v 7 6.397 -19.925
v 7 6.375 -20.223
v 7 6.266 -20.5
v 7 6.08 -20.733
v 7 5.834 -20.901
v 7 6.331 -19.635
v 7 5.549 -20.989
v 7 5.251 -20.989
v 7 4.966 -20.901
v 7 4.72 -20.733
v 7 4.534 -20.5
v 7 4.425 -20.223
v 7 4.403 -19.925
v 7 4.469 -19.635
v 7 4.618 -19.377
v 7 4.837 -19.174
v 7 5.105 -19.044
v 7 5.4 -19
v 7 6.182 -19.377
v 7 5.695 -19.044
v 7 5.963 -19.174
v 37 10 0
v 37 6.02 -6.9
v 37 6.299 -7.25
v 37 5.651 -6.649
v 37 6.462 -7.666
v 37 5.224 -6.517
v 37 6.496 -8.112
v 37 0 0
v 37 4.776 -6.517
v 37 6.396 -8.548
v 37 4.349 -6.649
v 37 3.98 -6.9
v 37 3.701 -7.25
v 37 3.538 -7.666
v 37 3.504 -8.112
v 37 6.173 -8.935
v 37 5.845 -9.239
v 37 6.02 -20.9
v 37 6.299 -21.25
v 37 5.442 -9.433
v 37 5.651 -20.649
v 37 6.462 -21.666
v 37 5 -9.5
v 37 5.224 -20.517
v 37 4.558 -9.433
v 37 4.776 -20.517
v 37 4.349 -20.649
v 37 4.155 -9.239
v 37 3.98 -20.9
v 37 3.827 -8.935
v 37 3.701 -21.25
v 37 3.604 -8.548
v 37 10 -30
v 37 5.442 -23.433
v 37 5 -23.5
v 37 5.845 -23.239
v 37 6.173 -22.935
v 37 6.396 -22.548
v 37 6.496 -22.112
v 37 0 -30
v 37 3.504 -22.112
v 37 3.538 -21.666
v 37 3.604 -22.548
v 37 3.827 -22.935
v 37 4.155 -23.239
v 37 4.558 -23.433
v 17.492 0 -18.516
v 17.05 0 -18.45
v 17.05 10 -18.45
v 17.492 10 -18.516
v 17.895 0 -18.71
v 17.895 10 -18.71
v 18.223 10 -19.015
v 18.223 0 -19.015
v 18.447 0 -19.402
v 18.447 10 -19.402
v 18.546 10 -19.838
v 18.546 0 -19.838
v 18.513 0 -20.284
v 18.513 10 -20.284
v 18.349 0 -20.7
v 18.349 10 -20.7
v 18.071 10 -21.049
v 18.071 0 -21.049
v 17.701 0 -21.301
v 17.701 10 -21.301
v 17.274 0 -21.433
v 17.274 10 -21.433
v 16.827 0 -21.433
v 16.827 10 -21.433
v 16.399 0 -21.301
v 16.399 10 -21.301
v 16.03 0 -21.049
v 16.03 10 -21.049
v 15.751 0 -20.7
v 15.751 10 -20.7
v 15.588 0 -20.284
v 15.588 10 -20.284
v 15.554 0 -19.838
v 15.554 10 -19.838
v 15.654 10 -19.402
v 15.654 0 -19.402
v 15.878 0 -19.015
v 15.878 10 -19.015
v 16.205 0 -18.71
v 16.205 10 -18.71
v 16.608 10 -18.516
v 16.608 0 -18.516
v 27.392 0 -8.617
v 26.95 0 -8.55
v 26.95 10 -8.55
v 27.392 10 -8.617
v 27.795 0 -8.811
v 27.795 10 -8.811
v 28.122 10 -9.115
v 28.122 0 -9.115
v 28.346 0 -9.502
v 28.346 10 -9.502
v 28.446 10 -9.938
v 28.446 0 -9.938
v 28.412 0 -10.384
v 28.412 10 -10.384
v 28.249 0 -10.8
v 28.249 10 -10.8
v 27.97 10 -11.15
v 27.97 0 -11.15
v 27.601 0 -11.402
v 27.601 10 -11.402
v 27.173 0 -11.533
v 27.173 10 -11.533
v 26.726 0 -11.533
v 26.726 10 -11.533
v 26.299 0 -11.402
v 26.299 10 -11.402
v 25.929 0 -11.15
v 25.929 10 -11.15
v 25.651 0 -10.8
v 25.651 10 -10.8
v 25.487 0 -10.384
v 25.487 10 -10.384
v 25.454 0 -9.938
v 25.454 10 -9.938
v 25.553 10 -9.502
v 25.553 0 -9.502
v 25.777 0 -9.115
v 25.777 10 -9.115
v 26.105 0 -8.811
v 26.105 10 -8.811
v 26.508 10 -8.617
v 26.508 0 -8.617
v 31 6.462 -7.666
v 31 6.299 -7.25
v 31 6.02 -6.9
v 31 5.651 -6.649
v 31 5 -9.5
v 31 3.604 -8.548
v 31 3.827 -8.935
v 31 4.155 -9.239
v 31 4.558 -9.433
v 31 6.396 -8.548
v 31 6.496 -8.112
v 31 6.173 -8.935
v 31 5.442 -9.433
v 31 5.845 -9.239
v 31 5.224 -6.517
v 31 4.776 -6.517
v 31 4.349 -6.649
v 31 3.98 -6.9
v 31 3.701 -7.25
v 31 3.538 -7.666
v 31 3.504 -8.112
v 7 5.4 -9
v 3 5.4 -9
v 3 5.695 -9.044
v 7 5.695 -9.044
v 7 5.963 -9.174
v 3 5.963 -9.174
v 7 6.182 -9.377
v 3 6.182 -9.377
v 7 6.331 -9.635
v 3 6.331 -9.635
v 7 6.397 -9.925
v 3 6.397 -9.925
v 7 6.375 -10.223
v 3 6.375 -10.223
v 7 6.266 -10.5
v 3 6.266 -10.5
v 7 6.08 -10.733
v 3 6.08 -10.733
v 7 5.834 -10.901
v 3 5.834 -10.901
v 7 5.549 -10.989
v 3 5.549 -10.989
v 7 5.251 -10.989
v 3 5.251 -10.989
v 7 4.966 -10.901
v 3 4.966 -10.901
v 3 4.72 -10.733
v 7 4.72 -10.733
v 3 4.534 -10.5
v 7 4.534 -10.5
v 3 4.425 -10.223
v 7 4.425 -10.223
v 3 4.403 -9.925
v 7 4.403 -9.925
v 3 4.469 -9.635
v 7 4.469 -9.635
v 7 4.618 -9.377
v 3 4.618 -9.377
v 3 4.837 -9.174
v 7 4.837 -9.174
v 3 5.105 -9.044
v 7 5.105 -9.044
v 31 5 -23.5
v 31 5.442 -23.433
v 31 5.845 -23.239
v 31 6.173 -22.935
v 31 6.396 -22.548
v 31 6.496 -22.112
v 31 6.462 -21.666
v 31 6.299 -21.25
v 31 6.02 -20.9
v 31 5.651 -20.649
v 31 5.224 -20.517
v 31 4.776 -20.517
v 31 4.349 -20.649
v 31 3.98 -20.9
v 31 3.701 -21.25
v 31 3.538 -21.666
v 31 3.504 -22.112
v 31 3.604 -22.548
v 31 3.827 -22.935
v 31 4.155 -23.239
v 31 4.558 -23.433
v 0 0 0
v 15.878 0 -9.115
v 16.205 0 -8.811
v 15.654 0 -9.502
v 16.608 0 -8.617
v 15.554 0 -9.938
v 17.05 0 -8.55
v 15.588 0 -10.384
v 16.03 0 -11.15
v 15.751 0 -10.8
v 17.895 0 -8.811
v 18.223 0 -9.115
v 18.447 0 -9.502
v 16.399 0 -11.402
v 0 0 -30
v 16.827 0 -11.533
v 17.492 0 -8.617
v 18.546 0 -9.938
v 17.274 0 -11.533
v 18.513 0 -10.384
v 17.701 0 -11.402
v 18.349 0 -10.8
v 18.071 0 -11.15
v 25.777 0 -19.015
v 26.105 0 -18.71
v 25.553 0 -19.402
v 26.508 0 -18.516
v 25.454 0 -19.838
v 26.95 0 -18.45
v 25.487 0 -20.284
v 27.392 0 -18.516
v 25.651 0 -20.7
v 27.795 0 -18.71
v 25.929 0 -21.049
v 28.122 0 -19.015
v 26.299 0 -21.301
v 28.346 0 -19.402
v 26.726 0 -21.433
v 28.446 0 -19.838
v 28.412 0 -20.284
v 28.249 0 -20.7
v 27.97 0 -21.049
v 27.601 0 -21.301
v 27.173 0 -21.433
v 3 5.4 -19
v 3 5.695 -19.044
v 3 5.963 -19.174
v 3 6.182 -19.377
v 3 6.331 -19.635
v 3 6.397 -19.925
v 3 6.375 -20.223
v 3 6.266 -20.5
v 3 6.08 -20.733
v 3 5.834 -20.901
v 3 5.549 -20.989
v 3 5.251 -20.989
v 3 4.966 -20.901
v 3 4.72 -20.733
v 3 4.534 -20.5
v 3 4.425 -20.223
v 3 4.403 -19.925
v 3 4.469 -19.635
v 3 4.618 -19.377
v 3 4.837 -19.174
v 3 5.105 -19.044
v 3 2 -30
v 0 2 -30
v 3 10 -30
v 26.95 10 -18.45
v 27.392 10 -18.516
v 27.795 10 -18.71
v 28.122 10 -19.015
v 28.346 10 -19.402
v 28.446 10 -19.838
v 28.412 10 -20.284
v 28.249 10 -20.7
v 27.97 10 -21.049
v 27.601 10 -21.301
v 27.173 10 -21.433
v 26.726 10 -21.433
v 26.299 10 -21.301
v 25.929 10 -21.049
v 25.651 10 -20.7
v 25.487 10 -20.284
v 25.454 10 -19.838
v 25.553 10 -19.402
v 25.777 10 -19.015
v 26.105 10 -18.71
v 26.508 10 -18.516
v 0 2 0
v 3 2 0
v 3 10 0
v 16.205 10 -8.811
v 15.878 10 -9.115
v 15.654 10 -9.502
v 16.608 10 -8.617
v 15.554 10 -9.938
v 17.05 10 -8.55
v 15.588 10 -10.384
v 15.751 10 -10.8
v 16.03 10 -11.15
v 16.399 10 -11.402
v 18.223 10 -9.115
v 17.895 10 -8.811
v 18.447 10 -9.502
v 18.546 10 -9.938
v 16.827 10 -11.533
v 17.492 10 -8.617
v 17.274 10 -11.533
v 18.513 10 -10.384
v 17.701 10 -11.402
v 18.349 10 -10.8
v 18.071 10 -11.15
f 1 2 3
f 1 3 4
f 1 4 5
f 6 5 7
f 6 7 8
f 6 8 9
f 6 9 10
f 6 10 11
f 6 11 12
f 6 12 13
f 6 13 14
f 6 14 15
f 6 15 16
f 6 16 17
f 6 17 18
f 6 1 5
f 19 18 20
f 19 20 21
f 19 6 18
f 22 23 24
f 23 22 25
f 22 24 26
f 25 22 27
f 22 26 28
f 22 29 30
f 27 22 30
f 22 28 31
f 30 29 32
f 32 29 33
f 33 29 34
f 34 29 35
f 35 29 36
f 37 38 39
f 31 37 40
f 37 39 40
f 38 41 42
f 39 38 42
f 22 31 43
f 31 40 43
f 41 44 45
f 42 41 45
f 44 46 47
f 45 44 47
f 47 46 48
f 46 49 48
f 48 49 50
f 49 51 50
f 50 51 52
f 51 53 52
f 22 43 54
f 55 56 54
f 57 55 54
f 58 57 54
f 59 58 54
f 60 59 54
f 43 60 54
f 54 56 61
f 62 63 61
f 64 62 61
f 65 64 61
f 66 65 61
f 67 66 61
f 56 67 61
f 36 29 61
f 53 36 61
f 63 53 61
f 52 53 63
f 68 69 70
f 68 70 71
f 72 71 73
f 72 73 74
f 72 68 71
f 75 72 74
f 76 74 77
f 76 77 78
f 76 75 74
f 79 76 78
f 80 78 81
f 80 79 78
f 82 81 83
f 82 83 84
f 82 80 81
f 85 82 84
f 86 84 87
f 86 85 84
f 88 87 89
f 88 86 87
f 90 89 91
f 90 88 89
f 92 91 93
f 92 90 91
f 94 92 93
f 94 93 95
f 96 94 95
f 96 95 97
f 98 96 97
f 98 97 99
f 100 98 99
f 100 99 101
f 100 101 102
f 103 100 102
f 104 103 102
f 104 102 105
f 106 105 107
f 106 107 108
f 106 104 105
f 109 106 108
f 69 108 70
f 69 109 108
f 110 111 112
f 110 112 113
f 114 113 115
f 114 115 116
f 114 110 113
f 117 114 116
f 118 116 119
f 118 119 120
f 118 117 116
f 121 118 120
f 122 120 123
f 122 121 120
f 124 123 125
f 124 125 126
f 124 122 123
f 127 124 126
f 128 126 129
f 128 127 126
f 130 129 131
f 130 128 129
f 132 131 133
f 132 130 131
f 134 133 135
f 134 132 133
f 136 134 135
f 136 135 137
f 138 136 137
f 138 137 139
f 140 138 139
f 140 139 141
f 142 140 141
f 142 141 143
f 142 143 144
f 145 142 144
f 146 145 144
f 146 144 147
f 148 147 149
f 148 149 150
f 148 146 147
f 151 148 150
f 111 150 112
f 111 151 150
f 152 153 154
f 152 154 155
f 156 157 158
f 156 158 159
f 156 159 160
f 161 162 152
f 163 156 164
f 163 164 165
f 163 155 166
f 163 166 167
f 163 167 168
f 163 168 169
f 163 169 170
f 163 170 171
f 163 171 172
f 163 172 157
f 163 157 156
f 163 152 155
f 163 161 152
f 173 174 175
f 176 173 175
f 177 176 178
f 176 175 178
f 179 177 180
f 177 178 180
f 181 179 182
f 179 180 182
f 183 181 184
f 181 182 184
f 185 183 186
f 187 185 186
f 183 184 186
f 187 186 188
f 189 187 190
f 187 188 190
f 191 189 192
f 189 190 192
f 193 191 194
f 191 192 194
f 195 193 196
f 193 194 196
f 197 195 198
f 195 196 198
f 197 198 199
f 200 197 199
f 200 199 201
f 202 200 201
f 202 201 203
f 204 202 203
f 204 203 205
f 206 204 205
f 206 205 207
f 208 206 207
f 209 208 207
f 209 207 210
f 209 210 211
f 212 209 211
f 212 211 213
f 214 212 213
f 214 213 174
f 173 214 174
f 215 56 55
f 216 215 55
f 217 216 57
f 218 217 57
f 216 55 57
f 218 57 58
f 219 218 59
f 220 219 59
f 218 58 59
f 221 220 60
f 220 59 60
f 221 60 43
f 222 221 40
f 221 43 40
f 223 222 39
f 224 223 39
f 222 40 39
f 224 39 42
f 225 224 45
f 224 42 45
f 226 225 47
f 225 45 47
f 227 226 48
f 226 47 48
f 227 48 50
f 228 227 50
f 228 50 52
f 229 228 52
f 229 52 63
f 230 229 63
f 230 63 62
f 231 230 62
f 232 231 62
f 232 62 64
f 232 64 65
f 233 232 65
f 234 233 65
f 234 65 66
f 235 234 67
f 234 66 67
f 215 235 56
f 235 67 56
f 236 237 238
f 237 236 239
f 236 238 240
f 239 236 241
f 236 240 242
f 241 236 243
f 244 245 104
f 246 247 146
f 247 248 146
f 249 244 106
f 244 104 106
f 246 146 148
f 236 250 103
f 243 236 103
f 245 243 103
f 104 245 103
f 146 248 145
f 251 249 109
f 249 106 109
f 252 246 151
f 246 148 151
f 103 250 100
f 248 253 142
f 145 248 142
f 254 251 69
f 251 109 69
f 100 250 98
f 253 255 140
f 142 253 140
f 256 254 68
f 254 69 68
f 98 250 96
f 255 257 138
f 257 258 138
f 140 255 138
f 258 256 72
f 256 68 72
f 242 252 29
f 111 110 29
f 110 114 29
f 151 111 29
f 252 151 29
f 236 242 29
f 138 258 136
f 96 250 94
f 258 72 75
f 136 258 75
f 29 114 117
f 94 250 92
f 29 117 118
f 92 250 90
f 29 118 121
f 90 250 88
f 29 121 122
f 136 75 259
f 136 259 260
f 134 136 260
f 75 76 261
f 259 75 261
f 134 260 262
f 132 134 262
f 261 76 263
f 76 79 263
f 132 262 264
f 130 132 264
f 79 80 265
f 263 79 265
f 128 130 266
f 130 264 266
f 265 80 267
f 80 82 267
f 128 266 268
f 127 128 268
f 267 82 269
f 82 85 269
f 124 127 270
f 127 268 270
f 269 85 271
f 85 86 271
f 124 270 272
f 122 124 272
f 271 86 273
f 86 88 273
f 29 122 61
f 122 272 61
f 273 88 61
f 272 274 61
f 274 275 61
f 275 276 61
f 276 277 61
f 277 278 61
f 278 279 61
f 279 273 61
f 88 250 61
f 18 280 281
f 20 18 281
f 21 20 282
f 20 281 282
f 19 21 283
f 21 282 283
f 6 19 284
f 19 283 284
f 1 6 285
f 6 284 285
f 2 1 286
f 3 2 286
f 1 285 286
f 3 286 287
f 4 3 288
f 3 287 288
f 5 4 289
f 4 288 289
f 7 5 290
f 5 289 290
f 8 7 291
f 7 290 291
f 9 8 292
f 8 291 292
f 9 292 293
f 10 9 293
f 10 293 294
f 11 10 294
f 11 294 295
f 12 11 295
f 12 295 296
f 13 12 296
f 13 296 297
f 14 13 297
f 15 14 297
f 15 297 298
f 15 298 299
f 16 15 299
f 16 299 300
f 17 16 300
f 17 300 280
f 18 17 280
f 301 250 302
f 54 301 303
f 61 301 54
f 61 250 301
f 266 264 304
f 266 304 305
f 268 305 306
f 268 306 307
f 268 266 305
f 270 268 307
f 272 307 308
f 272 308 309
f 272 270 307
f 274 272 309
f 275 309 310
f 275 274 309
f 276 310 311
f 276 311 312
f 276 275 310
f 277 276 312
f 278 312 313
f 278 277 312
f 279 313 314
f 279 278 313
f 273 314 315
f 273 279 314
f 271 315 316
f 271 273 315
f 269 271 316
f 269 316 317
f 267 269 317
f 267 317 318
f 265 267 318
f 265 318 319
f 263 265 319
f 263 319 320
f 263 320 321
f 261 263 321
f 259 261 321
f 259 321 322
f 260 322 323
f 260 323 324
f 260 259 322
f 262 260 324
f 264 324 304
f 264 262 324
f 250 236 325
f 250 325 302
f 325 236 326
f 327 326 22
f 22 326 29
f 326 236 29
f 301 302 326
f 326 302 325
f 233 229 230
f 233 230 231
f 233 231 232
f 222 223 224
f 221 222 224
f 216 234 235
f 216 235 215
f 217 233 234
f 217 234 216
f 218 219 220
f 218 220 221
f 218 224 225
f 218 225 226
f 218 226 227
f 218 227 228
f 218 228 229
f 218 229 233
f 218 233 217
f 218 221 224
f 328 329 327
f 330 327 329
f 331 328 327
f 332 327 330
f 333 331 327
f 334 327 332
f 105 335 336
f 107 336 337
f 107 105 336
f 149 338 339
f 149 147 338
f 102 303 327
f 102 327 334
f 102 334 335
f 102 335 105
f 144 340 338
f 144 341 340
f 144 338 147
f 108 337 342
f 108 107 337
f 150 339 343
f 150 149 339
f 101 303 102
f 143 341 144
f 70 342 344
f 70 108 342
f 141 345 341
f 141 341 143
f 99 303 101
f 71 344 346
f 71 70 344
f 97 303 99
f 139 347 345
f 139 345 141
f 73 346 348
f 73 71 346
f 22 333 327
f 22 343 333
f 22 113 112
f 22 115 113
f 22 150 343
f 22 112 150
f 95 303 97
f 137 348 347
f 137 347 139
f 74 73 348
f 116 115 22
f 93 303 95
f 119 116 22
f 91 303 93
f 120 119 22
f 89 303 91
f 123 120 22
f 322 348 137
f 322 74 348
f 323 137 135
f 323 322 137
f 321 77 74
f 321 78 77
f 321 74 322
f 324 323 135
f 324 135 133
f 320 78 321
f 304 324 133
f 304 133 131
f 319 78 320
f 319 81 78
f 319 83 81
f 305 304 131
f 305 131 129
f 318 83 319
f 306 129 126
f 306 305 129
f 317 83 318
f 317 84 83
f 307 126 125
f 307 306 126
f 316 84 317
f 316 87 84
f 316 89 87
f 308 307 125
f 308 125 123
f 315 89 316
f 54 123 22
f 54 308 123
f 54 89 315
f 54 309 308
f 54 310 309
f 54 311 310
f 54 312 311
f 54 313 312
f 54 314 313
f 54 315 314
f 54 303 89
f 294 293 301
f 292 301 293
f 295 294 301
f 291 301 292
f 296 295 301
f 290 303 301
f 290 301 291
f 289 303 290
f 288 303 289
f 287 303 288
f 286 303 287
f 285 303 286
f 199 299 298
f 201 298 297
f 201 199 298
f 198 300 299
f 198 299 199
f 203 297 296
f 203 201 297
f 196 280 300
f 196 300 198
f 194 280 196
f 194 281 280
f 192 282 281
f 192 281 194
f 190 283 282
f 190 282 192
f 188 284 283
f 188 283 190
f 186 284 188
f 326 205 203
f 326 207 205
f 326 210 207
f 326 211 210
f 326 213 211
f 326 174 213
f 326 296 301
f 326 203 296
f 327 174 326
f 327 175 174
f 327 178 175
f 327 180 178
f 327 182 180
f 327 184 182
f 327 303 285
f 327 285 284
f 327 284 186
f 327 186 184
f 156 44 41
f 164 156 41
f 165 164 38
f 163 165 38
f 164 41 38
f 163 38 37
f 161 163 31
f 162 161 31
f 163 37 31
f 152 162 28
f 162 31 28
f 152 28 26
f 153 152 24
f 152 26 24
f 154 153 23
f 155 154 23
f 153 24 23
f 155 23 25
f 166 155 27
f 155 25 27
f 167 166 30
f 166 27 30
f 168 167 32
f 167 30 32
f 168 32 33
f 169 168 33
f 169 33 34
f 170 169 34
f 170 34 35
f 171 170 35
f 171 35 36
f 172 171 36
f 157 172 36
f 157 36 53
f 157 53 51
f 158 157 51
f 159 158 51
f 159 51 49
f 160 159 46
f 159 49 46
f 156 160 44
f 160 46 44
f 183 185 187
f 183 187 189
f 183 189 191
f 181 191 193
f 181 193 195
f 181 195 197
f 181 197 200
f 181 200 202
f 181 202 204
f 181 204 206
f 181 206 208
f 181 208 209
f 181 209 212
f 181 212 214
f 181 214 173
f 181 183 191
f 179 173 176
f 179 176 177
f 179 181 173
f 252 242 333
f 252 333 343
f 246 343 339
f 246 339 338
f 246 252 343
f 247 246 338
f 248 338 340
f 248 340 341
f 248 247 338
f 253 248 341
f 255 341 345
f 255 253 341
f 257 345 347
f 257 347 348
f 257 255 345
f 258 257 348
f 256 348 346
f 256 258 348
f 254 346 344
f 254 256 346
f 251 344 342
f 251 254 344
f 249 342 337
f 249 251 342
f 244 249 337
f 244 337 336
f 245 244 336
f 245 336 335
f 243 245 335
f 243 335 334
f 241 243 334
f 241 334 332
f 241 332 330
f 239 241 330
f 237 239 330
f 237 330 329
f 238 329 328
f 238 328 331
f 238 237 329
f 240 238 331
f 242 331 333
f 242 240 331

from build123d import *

# Parameters (mm, degrees)
SKETCH_1_W          = 37
SKETCH_1_H          = 30
SKETCH_1_R          = 1.5
EXTRUDE_1_DEPTH     = 10
SKETCH_2_R          = 1.5
CUT_EXTRUDE_1_DEPTH = 6
SKETCH_3_W          = 30
SKETCH_3_H          = 8
CUT_EXTRUDE_2_DEPTH = 3
SKETCH_4_R          = 1
CUT_EXTRUDE_3_DEPTH = 7


with BuildPart() as part:
    # Эскиз1 → Бобышка-Вытянуть1 (new body)
    with BuildSketch(Plane(origin=(0, 0, 0), x_dir=(1, 0, 0), z_dir=(0, 1, 0))):
        with Locations((18.5, 15)):
            Rectangle(SKETCH_1_W, SKETCH_1_H)
        with Locations(Location((26.949747468, 19.949747468, 0), (0, 0, 270))):
            Circle(SKETCH_1_R, mode=Mode.SUBTRACT)
        with Locations(Location((17.050252532, 19.949747468, 0), (0, 0, 270))):
            Circle(SKETCH_1_R, mode=Mode.SUBTRACT)
        with Locations(Location((26.949747468, 10.050252532, 0), (0, 0, 270))):
            Circle(SKETCH_1_R, mode=Mode.SUBTRACT)
        with Locations(Location((17.050252532, 10.050252532, 0), (0, 0, 270))):
            Circle(SKETCH_1_R, mode=Mode.SUBTRACT)
    extrude(amount=EXTRUDE_1_DEPTH)

    # Эскиз2 → Вырез-Вытянуть1 (cut)
    with BuildSketch(Plane(origin=(37, 0, 0), x_dir=(0, 0, -1), z_dir=(1, 0, 0))):
        with Locations((8, 5)):
            Circle(SKETCH_2_R)
        with Locations((22, 5)):
            Circle(SKETCH_2_R)
    extrude(amount=-CUT_EXTRUDE_1_DEPTH, mode=Mode.SUBTRACT)

    # Эскиз3 → Вырез-Вытянуть2 (cut)
    with BuildSketch(Plane.ZY):
        with Locations((-15, 6)):
            Rectangle(SKETCH_3_W, SKETCH_3_H)
    extrude(amount=-CUT_EXTRUDE_2_DEPTH, mode=Mode.SUBTRACT)

    # Эскиз4 → Вырез-Вытянуть3 (cut)
    with BuildSketch(Plane.ZY):
        with Locations((-20, 5.4)):
            Circle(SKETCH_4_R)
        with Locations((-10, 5.4)):
            Circle(SKETCH_4_R)
    extrude(amount=-CUT_EXTRUDE_3_DEPTH, mode=Mode.SUBTRACT)


solid = part.part
